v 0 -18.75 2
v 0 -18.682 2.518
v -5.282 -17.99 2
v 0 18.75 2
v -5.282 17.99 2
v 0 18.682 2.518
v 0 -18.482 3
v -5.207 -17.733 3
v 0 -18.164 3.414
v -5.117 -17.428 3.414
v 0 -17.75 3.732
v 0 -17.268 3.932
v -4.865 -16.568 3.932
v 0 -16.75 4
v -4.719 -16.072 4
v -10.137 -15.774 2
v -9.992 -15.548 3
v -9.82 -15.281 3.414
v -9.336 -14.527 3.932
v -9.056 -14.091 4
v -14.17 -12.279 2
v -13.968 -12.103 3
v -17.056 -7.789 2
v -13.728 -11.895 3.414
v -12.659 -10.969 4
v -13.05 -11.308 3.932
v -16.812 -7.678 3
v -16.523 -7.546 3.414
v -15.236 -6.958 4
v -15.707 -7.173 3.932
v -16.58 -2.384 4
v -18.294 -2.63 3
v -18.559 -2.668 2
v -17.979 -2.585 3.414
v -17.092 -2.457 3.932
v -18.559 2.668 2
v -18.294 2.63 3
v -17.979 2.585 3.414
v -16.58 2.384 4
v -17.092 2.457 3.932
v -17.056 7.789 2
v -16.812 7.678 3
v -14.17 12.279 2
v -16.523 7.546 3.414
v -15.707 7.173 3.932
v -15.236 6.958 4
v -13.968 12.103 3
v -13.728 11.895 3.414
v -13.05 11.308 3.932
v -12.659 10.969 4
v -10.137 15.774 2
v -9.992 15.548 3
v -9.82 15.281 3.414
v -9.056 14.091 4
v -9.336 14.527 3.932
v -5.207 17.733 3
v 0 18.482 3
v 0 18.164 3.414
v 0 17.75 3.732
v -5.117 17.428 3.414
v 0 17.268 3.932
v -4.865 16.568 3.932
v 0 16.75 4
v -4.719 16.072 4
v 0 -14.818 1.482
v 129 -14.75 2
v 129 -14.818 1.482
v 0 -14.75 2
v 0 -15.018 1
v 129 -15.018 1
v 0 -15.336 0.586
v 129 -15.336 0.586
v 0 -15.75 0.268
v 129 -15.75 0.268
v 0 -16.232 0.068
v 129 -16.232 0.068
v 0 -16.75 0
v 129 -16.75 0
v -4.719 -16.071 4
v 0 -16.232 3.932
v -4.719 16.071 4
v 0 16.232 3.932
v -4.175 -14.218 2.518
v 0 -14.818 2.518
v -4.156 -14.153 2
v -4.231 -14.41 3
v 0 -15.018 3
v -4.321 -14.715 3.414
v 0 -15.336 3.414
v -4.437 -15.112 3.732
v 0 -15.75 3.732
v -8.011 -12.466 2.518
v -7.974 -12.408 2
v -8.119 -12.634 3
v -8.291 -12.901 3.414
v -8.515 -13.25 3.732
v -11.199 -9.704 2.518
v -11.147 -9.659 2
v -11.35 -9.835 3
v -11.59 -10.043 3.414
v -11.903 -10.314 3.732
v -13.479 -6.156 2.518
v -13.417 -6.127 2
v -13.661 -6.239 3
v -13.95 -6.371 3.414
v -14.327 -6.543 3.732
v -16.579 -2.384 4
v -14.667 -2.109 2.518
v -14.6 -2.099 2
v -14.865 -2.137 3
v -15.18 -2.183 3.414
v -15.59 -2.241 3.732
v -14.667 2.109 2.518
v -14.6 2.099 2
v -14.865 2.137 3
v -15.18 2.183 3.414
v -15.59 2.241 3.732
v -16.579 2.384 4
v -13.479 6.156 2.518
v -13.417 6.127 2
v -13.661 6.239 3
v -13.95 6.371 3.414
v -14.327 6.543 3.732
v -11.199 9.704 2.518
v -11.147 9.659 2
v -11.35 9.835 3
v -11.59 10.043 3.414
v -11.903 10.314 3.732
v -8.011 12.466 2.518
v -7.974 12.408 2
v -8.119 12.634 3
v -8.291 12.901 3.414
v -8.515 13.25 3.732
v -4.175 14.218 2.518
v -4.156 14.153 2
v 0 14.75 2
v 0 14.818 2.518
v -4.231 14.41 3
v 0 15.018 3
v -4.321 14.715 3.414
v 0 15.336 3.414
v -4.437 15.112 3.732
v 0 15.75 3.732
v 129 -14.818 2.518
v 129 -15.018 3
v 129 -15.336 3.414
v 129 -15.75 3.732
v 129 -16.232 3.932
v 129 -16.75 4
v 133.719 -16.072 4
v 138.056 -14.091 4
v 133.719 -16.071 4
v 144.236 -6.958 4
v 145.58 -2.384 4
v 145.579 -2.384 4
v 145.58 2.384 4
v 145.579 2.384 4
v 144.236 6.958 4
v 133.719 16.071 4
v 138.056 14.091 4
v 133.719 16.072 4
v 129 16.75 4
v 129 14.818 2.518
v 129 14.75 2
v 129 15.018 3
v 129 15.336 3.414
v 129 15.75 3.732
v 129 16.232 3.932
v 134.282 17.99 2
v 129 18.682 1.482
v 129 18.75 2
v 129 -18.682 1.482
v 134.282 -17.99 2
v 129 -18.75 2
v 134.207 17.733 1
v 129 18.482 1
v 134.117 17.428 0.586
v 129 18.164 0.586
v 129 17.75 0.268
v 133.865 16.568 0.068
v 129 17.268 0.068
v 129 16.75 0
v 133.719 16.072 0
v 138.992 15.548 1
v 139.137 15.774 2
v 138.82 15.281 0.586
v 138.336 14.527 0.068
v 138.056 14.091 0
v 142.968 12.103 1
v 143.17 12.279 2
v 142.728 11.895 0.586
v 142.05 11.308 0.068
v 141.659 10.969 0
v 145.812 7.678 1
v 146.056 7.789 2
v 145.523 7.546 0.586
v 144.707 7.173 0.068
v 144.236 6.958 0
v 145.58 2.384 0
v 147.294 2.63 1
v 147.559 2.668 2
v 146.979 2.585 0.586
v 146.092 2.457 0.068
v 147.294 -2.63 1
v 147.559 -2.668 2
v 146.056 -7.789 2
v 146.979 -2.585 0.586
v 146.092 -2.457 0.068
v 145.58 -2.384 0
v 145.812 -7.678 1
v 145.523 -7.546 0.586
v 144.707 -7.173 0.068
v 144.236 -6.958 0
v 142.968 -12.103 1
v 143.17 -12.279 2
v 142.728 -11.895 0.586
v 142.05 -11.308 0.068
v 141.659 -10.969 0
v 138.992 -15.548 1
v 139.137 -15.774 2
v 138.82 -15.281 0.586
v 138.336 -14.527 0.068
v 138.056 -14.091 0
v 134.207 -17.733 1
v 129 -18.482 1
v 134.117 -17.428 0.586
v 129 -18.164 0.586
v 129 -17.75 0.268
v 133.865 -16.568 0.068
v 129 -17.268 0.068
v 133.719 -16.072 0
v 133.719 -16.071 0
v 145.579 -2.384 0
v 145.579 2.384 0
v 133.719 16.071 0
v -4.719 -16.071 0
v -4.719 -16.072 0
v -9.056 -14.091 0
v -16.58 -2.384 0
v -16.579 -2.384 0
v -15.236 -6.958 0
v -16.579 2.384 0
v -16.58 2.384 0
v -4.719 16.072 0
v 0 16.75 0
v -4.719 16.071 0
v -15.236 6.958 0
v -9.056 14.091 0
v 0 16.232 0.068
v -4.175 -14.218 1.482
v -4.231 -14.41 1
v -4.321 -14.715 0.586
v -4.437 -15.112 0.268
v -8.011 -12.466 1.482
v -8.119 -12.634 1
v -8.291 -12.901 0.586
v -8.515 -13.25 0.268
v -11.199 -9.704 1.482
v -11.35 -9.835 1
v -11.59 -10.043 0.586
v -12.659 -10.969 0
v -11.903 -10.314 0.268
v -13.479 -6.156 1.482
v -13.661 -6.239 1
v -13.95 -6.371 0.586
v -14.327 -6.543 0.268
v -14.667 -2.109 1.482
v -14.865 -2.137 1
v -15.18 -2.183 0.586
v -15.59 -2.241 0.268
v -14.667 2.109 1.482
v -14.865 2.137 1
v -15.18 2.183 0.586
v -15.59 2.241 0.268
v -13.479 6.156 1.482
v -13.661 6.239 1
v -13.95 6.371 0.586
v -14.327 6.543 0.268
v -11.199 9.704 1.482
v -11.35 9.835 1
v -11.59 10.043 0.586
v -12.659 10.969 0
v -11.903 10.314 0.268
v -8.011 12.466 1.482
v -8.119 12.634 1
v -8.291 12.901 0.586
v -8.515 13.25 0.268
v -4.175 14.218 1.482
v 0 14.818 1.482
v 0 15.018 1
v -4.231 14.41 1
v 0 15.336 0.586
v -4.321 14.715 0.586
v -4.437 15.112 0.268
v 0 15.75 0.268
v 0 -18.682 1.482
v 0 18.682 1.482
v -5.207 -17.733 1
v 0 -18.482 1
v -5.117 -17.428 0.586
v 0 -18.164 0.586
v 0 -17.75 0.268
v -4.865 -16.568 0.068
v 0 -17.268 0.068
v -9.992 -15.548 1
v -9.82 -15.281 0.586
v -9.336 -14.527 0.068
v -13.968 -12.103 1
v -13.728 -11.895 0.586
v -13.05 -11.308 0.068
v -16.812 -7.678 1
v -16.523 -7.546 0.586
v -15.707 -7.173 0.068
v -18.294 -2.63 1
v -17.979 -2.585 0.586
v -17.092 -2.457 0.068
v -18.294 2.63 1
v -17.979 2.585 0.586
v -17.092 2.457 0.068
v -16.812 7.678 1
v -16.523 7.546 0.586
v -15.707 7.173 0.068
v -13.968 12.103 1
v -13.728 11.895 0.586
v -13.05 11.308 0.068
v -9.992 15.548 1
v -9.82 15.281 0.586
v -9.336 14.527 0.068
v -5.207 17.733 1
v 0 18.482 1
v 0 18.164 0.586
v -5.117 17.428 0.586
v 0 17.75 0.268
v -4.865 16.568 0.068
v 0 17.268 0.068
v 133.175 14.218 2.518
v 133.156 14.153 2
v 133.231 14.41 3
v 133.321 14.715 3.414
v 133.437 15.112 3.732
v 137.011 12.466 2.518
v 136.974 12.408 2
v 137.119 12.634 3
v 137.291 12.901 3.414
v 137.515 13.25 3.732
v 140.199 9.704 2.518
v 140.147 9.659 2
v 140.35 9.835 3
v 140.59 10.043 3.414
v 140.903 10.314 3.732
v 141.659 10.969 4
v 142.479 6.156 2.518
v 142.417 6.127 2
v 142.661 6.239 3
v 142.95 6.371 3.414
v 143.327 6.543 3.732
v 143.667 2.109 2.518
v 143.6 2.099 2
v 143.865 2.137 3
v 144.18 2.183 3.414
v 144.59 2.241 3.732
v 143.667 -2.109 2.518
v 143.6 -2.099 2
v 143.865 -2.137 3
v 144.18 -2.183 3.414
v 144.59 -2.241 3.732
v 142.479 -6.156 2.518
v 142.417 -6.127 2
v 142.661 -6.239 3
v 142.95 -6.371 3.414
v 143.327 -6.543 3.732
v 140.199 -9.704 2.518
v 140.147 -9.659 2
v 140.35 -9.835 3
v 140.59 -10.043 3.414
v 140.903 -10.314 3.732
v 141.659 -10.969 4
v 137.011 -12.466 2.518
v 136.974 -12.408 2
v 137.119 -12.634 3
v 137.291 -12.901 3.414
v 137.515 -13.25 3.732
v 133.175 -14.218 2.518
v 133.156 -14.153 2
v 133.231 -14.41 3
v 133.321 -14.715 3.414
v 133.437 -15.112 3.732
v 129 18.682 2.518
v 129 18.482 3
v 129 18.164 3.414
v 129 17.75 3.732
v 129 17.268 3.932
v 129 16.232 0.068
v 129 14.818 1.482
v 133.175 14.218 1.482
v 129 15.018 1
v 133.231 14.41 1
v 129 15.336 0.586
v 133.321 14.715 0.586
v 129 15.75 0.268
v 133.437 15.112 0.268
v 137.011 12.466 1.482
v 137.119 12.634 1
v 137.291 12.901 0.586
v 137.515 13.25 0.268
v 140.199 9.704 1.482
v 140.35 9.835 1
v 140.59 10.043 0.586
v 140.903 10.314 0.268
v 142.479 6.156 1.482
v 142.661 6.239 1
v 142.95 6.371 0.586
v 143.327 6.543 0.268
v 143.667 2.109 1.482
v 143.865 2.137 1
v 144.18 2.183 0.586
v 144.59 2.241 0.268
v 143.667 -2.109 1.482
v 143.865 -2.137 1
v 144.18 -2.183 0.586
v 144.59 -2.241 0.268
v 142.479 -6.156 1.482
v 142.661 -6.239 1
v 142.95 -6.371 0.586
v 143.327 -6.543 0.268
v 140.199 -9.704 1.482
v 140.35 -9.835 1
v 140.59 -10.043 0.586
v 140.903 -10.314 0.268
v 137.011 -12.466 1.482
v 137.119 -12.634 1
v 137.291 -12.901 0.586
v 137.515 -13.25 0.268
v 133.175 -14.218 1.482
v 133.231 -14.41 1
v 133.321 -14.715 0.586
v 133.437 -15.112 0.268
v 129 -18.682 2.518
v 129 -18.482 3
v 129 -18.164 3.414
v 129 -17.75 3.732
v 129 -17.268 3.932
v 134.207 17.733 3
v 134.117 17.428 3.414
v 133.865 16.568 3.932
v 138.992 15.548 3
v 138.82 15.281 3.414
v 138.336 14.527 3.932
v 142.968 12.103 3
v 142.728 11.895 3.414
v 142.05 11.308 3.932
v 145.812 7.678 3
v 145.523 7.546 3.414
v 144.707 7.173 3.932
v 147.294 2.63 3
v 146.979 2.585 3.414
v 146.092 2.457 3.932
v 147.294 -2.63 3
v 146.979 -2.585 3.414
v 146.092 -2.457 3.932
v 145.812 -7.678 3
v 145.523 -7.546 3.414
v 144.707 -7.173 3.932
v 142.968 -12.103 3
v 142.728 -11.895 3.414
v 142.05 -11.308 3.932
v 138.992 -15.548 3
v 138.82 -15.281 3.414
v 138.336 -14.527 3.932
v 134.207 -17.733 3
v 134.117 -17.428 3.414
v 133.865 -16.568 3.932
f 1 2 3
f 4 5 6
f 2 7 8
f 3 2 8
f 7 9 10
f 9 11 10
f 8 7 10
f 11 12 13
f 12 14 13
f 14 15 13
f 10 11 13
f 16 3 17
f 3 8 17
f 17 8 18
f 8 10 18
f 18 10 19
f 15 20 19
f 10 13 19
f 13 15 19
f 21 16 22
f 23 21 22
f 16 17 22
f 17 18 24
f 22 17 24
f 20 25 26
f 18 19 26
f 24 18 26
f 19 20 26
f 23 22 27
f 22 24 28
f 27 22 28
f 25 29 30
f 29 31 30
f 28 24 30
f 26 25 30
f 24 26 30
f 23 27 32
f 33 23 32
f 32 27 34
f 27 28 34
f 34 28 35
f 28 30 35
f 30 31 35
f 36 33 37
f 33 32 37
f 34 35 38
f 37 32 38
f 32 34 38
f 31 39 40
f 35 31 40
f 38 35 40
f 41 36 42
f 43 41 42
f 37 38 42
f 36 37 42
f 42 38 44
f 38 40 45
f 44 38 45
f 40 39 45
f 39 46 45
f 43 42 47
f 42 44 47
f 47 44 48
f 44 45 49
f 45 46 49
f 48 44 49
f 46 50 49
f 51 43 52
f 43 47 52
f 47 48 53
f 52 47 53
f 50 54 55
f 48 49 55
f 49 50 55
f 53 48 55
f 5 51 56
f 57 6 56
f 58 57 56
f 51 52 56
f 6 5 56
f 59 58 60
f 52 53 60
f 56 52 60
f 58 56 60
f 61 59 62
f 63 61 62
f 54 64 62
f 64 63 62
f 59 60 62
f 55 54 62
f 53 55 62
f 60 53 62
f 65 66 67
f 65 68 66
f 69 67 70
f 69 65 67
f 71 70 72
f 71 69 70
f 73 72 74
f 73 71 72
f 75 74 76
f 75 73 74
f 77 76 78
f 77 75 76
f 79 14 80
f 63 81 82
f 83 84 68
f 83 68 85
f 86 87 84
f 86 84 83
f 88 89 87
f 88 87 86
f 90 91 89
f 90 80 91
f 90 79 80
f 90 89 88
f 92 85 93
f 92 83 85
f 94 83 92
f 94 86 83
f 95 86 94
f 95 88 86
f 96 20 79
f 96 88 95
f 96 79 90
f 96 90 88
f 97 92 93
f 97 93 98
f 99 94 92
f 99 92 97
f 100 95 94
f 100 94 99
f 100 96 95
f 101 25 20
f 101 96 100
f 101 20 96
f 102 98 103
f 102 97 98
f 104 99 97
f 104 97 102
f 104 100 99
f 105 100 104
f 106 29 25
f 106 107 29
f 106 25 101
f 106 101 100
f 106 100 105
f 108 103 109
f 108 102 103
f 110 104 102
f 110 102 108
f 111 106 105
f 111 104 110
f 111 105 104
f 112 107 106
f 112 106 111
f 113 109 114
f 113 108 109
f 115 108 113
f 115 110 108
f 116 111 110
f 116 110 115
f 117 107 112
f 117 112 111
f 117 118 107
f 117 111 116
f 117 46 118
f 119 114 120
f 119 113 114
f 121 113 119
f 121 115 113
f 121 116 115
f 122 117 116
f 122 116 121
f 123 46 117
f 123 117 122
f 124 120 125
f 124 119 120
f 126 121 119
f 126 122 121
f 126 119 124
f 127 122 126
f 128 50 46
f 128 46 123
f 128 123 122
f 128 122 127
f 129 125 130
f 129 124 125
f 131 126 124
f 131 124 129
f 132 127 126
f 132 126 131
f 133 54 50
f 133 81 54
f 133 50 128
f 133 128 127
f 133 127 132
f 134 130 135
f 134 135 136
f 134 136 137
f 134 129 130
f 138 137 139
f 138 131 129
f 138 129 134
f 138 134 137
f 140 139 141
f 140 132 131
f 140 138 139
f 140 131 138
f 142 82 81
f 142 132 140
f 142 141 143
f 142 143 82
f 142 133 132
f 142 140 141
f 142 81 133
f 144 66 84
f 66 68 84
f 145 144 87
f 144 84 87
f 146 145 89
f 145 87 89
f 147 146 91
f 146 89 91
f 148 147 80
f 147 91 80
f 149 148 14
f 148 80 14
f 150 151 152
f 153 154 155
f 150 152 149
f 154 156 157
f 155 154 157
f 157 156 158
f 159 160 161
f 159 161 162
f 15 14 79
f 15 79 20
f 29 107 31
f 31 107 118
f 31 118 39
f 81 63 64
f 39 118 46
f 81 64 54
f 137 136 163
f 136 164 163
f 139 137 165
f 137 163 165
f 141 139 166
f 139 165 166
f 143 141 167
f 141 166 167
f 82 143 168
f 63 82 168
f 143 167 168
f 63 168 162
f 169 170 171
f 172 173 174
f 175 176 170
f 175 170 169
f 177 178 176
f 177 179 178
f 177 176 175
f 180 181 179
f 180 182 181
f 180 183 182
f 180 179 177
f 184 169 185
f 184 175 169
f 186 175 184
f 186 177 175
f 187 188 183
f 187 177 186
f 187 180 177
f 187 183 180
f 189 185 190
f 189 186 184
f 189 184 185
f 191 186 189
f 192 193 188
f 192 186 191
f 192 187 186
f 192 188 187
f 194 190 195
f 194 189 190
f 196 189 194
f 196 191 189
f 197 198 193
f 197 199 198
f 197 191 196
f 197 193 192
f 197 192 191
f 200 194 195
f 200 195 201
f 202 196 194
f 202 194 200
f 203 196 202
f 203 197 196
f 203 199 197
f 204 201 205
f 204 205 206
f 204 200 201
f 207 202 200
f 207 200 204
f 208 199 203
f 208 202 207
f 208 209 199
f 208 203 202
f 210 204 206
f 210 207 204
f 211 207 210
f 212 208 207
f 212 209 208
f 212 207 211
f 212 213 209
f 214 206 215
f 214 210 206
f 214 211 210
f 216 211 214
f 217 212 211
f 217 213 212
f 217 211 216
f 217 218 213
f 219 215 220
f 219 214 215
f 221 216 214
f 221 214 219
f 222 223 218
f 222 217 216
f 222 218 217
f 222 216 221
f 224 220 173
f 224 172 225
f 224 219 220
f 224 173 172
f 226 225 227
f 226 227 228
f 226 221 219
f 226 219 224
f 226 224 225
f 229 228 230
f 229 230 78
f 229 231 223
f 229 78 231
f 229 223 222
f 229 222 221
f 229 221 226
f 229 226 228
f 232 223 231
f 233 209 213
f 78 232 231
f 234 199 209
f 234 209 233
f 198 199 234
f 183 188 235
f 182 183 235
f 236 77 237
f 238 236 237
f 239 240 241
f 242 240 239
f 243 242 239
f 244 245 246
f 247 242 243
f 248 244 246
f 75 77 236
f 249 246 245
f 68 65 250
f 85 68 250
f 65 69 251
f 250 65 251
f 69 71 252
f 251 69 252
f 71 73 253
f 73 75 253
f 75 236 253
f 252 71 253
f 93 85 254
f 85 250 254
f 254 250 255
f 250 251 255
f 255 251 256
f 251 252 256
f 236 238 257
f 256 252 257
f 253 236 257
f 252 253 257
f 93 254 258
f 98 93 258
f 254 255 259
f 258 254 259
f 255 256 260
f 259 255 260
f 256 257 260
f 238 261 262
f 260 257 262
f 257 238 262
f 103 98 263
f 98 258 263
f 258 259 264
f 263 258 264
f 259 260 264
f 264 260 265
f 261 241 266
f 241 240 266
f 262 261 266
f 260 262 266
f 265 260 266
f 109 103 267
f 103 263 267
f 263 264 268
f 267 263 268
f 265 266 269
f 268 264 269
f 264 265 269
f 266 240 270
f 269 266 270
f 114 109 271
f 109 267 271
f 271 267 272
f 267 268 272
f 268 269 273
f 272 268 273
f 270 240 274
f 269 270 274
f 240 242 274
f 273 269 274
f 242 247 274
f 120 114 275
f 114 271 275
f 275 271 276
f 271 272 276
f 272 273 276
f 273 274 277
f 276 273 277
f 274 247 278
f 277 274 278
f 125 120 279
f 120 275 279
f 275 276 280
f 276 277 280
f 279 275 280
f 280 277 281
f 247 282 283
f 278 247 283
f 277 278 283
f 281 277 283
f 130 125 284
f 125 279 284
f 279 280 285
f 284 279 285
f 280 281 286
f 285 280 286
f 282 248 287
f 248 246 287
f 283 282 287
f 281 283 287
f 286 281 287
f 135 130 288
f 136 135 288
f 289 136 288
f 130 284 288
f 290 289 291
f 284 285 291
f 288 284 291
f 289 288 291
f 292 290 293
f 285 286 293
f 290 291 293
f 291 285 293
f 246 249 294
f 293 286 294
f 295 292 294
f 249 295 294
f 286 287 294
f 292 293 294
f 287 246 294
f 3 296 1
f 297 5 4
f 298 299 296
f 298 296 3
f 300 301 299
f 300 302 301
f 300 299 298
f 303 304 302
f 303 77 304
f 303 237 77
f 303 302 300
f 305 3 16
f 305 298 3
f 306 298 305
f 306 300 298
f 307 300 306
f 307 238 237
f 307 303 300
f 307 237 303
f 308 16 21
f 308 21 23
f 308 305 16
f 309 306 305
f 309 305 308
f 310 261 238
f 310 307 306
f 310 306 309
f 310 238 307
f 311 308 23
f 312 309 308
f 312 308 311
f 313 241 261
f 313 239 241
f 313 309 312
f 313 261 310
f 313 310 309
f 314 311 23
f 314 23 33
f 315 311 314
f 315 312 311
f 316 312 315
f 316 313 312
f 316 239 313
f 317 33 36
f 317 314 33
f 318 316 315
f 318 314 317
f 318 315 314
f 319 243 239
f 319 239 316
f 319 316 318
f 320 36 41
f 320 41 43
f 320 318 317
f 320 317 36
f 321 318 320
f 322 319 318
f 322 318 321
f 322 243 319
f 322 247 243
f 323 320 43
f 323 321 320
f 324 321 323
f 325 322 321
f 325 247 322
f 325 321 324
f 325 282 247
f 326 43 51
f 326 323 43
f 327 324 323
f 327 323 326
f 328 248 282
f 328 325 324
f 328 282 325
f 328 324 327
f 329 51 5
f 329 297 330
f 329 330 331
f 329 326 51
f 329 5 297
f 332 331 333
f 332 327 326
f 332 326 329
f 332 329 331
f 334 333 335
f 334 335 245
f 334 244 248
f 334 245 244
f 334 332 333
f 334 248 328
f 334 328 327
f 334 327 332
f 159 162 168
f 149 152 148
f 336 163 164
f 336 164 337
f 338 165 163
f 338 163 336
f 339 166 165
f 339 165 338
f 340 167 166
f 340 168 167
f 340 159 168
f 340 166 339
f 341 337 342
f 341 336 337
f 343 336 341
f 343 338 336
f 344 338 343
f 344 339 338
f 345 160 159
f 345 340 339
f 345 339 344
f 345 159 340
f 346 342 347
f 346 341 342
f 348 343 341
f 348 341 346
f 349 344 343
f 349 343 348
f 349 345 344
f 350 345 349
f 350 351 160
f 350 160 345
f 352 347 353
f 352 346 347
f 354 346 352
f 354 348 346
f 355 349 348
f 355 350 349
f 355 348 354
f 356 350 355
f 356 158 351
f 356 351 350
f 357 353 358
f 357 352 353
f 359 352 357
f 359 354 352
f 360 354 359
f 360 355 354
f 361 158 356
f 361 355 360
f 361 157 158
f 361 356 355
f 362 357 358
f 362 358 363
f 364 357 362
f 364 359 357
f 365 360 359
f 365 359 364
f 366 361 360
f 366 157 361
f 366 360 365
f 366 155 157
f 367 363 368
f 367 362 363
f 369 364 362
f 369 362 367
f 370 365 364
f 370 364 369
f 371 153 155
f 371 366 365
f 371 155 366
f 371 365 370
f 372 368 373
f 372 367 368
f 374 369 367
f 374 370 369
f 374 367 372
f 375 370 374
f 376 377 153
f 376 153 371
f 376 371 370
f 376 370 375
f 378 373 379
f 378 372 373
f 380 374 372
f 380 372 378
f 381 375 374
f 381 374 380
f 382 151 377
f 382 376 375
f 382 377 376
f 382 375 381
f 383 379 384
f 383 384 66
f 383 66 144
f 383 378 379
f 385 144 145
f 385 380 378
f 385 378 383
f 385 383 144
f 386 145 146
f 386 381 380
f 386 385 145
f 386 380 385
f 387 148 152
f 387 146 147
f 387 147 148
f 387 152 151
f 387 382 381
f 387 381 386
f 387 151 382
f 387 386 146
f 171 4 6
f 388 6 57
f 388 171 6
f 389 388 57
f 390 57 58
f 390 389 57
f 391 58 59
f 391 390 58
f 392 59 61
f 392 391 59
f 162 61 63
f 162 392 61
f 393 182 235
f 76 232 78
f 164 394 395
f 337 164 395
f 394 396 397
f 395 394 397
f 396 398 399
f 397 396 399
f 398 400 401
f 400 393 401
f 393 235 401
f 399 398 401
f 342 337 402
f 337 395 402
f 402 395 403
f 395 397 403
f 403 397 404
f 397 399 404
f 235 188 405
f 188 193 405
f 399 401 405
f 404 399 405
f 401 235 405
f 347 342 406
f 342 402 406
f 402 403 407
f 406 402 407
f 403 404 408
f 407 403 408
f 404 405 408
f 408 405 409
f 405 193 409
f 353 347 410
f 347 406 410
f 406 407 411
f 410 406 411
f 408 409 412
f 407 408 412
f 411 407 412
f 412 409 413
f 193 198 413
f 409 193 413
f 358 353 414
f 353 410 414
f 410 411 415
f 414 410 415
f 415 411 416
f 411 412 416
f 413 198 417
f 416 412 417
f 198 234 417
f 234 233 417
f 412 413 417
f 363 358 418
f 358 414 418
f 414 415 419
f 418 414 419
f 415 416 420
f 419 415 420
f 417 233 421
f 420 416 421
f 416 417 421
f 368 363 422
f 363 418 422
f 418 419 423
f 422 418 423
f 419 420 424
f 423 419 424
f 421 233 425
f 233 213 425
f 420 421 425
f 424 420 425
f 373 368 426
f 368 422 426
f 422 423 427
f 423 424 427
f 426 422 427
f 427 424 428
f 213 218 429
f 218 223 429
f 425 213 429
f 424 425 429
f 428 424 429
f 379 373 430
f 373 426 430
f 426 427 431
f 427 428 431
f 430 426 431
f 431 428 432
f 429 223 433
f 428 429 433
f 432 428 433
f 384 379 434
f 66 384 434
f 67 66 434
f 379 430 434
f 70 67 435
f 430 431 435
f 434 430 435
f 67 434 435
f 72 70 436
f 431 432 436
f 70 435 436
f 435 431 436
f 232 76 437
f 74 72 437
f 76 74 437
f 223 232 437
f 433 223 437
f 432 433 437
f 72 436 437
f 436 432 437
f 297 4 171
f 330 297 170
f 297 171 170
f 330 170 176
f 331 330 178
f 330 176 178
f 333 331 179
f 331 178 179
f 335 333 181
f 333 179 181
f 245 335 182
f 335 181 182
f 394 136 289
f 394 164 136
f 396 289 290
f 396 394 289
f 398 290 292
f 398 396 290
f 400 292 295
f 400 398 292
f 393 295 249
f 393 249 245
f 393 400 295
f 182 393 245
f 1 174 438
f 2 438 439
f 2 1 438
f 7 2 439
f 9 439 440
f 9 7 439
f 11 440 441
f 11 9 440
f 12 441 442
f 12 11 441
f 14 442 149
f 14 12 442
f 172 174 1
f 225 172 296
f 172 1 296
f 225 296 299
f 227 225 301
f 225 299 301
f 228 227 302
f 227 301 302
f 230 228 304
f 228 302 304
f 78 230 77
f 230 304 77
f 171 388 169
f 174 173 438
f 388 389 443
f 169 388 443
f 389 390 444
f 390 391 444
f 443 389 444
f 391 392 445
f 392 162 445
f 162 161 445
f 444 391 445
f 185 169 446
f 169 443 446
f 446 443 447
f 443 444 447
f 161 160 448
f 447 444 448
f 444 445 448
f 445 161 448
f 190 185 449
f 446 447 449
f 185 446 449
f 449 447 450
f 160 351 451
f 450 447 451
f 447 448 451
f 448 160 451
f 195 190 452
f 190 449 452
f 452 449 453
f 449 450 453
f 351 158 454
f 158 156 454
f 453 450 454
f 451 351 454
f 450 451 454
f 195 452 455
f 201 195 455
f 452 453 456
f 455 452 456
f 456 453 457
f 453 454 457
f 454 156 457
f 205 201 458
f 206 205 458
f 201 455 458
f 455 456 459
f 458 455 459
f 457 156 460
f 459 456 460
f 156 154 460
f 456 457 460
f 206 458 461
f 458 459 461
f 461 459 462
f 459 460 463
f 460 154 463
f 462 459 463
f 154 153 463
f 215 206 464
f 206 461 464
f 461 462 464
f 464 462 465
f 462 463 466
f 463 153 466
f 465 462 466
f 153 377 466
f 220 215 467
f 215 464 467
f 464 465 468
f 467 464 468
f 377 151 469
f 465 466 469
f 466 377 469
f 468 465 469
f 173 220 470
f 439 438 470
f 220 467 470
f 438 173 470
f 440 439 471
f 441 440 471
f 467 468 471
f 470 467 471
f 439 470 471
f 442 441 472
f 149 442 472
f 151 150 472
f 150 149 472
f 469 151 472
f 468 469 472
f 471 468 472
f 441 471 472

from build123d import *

# Parameters (mm, degrees)
BOSS_EXTRU_1_DEPTH = 4
CONG_1_R           = 2


with BuildPart() as part:
    # Esquisse1 → Boss.-Extru.1 (new body)
    with BuildSketch(Plane.XY):
        with BuildLine():
            Line((0, 18.75), (129, 18.75))
            ThreePointArc((129, 18.75), (147.75, 0), (129, -18.75))
            Line((129, -18.75), (0, -18.75))
            ThreePointArc((0, -18.75), (-18.75, 0), (0, 18.75))
        make_face()
        with BuildLine():
            Line((0, 14.75), (129, 14.75))
            ThreePointArc((129, 14.75), (143.75, 0), (129, -14.75))
            Line((129, -14.75), (0, -14.75))
            ThreePointArc((0, -14.75), (-14.75, 0), (0, 14.75))
        make_face(mode=Mode.SUBTRACT)
    extrude(amount=BOSS_EXTRU_1_DEPTH)

    # Congé1
    cong_1_edges = [part.edges().sort_by_distance(p)[0] for p in [
        (143.75, 0, 0),
        (64.5, -14.75, 0),
        (-14.75, 0, 0),
        (147.75, 0, 0),
        (64.5, -18.75, 0),
        (-18.75, 0, 0),
        (143.75, 0, 4),
        (64.5, -14.75, 4),
        (-14.75, 0, 4),
        (147.75, 0, 4),
        (64.5, -18.75, 4),
        (-18.75, 0, 4),
        (64.5, 14.75, 0),
        (64.5, 18.75, 0),
        (64.5, 14.75, 4),
        (64.5, 18.75, 4),
    ]]
    fillet(cong_1_edges, radius=CONG_1_R - 0.0001)  # a hair under: the kernel refuses the full size


solid = part.part
